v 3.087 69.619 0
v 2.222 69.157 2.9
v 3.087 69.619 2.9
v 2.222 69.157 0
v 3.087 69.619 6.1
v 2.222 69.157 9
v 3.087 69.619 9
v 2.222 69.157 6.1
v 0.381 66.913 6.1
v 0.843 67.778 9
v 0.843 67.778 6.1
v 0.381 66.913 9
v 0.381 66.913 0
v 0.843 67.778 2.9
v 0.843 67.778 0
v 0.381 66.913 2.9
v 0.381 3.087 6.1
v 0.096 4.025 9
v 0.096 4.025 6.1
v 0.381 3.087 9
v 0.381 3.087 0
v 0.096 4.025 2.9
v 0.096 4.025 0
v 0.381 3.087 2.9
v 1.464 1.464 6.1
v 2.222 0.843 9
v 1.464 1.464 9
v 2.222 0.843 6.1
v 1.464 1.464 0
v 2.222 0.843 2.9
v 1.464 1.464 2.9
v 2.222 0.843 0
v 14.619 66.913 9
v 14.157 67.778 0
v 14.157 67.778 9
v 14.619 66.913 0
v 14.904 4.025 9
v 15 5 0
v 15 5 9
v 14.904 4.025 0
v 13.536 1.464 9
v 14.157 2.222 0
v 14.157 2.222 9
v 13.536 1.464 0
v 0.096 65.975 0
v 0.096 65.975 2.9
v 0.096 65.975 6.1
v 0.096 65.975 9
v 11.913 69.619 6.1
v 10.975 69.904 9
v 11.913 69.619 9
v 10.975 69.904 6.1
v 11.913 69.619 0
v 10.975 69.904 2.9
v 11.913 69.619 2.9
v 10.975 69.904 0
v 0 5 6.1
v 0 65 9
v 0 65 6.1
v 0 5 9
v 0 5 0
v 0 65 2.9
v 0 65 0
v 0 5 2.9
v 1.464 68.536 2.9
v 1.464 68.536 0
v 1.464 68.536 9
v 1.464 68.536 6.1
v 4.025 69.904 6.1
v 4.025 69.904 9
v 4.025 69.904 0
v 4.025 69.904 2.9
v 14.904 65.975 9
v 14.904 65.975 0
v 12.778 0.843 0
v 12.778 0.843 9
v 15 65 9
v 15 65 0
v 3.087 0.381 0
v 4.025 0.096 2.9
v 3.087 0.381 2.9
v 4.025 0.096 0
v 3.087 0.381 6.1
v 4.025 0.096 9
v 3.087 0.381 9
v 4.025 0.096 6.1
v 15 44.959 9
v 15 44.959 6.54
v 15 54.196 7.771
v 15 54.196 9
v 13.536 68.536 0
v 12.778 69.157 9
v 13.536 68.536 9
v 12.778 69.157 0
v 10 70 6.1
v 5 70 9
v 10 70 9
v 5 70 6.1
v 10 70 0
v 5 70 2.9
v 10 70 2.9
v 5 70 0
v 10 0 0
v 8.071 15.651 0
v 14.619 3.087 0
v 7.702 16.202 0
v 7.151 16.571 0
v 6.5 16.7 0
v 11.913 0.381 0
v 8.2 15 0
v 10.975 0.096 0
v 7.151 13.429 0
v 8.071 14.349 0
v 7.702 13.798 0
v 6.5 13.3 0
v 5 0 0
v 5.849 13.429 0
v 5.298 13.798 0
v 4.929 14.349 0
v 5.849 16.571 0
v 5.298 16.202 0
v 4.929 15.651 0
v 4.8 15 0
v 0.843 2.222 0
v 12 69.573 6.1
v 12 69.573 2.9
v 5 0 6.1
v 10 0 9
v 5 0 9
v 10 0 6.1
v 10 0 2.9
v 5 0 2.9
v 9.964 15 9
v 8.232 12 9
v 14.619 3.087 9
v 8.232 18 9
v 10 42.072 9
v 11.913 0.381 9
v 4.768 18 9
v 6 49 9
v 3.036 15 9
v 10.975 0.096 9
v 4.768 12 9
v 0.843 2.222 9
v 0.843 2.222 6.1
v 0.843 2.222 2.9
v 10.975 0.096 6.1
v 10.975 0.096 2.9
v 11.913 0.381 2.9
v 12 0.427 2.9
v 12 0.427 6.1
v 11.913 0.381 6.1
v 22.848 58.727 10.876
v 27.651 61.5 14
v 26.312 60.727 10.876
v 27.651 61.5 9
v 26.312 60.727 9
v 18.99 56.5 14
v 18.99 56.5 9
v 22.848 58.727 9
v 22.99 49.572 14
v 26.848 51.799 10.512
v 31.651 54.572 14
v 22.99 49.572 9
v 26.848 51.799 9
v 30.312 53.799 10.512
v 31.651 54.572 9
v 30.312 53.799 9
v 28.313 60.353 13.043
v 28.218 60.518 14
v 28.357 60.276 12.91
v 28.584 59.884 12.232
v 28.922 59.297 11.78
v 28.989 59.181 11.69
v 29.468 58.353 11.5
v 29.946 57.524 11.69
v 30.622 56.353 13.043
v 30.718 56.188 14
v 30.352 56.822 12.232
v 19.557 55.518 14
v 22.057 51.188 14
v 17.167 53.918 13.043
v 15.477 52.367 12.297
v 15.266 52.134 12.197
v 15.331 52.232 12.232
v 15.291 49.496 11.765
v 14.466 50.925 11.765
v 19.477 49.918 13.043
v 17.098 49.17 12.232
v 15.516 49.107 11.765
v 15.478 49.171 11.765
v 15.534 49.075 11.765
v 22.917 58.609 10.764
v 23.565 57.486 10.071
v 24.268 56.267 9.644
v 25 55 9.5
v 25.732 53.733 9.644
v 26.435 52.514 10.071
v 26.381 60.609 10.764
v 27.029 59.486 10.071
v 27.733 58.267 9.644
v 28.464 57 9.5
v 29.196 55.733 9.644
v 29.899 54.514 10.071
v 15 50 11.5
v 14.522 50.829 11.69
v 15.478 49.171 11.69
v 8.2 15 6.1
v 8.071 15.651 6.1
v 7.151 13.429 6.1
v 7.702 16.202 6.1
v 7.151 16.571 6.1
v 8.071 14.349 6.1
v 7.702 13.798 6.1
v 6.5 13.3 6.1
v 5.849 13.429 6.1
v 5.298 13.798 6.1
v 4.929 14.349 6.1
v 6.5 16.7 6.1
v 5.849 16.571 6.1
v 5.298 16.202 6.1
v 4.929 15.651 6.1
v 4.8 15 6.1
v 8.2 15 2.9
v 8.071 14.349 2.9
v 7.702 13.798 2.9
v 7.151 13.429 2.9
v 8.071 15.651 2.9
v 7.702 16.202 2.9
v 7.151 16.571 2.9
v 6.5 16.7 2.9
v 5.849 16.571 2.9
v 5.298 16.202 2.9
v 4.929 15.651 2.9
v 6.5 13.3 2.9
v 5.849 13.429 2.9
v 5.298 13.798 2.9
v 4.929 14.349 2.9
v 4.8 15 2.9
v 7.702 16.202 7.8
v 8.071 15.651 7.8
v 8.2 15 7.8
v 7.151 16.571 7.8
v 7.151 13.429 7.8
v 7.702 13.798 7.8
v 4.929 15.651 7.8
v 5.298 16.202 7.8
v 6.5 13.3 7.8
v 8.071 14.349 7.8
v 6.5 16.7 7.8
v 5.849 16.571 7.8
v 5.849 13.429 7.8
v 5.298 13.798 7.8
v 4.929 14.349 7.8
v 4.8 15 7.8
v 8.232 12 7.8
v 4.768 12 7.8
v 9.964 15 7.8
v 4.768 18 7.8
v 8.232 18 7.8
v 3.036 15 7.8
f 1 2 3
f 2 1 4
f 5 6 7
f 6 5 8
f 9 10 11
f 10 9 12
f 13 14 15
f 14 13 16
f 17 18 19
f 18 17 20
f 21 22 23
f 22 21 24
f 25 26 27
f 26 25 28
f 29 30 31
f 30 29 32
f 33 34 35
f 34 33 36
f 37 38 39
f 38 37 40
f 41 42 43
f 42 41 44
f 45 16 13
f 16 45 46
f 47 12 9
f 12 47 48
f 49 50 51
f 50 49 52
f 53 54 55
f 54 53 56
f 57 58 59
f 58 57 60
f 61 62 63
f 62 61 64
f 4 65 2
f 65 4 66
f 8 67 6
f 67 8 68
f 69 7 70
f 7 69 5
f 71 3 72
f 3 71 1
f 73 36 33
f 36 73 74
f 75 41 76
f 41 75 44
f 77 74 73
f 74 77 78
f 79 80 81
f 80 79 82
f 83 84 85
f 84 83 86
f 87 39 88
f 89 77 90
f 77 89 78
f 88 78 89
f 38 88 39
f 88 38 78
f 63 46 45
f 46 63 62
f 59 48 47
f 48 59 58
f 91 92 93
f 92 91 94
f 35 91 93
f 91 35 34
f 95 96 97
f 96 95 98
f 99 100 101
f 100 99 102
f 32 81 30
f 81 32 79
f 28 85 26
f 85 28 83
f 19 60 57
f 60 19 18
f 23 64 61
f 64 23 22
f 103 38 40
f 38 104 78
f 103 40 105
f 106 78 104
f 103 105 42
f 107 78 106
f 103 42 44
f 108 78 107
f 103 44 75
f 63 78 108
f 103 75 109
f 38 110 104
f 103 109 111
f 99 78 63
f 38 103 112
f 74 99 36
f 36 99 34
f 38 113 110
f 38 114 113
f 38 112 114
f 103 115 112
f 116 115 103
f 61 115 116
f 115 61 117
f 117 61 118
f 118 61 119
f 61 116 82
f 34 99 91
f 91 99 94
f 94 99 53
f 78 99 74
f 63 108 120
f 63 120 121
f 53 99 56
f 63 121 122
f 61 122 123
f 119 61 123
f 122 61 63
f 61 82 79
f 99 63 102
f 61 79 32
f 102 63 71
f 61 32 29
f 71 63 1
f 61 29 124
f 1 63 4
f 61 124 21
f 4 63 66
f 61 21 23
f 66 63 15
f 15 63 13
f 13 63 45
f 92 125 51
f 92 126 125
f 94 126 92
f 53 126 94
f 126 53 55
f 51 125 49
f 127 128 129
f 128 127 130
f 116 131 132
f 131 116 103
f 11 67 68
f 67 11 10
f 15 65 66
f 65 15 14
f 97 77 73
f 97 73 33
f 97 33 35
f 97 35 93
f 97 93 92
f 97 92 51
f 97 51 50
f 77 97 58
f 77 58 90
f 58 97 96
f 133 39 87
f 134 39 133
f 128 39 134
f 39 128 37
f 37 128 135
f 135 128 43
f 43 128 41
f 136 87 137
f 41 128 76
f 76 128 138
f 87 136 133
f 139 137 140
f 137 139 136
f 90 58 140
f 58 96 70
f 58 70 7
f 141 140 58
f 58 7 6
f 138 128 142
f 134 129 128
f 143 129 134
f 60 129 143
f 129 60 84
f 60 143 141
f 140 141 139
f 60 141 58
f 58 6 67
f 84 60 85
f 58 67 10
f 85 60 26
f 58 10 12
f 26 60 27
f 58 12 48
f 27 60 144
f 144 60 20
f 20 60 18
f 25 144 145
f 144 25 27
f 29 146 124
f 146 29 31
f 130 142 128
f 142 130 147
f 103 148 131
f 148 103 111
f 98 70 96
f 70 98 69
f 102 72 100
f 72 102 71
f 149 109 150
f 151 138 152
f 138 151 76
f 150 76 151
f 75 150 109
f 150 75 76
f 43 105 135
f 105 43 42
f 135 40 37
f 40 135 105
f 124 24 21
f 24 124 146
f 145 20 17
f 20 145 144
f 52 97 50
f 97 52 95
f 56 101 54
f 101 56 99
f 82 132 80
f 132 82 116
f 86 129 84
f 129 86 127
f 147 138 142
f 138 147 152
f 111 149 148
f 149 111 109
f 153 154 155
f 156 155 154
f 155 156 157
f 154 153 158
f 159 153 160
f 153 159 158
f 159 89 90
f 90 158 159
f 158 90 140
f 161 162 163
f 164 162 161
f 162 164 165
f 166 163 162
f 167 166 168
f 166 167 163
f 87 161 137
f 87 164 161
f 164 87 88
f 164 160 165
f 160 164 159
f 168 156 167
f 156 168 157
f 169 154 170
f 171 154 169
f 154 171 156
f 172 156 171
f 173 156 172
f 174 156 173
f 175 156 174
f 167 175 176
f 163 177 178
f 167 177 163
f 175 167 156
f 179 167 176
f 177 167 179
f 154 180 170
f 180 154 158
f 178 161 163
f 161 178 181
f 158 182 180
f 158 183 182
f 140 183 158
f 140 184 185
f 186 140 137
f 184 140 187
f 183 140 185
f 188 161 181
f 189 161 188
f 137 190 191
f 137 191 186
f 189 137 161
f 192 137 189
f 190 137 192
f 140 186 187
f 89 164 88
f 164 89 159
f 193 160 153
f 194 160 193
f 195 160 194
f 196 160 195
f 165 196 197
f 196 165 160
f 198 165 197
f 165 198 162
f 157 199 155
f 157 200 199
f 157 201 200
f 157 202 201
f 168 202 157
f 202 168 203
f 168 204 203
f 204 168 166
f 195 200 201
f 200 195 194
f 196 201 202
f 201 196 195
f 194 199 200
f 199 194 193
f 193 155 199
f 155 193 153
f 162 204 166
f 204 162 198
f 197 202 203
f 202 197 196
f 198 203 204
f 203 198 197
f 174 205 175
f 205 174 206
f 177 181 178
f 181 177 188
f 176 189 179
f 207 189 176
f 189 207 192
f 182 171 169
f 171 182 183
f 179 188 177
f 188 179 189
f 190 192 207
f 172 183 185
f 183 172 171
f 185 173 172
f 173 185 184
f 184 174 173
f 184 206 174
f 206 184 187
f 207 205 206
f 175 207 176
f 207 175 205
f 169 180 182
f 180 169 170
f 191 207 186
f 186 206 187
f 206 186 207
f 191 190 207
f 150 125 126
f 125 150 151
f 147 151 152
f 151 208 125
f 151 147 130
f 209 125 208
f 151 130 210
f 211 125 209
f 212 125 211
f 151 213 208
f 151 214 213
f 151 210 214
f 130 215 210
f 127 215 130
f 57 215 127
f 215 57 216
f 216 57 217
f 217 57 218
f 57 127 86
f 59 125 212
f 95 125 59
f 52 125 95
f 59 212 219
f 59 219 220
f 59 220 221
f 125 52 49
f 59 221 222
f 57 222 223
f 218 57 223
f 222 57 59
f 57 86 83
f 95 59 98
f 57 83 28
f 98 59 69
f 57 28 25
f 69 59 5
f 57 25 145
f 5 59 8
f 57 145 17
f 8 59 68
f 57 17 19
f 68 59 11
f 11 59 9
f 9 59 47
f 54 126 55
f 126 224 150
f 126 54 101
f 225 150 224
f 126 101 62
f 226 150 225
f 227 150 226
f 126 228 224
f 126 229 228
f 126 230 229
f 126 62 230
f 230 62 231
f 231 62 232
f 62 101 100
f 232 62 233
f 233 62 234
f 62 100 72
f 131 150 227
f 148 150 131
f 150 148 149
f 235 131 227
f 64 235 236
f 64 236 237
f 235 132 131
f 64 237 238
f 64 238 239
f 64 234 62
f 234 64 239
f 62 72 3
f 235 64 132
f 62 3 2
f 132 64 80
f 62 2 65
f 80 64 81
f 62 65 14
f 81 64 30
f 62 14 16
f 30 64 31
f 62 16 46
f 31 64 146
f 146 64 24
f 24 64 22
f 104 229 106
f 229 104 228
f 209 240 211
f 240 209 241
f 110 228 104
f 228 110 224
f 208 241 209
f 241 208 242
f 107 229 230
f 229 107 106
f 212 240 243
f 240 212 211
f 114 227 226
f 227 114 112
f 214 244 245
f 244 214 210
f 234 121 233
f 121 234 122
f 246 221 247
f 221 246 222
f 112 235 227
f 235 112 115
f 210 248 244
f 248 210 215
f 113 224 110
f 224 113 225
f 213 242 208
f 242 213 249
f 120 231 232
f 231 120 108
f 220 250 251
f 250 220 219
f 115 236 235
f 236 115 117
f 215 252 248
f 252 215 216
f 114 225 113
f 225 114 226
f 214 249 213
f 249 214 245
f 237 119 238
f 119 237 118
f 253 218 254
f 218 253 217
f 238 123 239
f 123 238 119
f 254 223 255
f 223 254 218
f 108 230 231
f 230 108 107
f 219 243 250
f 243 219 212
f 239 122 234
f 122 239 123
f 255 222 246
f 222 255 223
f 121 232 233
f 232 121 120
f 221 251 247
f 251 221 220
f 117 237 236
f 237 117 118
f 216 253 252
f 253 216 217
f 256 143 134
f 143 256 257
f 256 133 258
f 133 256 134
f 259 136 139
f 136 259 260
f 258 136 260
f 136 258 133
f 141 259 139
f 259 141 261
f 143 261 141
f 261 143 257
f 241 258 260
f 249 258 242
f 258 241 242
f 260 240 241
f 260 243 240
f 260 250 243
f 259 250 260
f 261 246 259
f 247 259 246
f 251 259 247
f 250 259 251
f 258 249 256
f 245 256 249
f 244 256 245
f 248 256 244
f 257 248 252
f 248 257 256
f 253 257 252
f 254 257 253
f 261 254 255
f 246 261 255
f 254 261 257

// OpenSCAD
//5.5 70 42 15

nut=6;

module nut()
    {
    cylinder(d=(2*(tan(30)*nut_size)),h=nut_h, center=center, $fn=6); // don't do anything here
        //echo ("point to point:"); // this just echoes
        //echo ((tan(30)*nut_size)*2); //the diameter of a circle that will encompass the exterior of the hexagonal shape.
    }


difference(){
    union(){
        minkowski(){
            cube([5,60,4.5]);
            translate([5,5])cylinder(d=10,h=4.5,$fn=32);
        }
        //translate([10,42,9])rotate([0,0,30])cube([25,8,5]);
        
        translate([6,49,9])
            rotate([90,0,30])
                linear_extrude(8)polygon(
                    points = [[0,-4],[15,0],[25,0],[25,5],[15,5],[0,0]]);
    }

    union(){
        translate([25,55,17])
            rotate([0,90,30])
            difference(){
                cylinder(d=20,h=4,$fn=32);
                cylinder(d=15,h=4,$fn=32);
            }
        translate([15,50,14])rotate([0,90,30])cylinder(d=5,h=20,$fn=16);
        translate([-3,0,(9-3.2)/2])cube([15,70,3.2]);
        translate([15-3-5.5,15,0])cylinder(d=3.4,h=10,$fn=16);
        translate([15-3-5.5,15,9-1.2])nut(nut_size=nut,nut_h=4,center=false);
    }
}


%cube([15,70,9]);
